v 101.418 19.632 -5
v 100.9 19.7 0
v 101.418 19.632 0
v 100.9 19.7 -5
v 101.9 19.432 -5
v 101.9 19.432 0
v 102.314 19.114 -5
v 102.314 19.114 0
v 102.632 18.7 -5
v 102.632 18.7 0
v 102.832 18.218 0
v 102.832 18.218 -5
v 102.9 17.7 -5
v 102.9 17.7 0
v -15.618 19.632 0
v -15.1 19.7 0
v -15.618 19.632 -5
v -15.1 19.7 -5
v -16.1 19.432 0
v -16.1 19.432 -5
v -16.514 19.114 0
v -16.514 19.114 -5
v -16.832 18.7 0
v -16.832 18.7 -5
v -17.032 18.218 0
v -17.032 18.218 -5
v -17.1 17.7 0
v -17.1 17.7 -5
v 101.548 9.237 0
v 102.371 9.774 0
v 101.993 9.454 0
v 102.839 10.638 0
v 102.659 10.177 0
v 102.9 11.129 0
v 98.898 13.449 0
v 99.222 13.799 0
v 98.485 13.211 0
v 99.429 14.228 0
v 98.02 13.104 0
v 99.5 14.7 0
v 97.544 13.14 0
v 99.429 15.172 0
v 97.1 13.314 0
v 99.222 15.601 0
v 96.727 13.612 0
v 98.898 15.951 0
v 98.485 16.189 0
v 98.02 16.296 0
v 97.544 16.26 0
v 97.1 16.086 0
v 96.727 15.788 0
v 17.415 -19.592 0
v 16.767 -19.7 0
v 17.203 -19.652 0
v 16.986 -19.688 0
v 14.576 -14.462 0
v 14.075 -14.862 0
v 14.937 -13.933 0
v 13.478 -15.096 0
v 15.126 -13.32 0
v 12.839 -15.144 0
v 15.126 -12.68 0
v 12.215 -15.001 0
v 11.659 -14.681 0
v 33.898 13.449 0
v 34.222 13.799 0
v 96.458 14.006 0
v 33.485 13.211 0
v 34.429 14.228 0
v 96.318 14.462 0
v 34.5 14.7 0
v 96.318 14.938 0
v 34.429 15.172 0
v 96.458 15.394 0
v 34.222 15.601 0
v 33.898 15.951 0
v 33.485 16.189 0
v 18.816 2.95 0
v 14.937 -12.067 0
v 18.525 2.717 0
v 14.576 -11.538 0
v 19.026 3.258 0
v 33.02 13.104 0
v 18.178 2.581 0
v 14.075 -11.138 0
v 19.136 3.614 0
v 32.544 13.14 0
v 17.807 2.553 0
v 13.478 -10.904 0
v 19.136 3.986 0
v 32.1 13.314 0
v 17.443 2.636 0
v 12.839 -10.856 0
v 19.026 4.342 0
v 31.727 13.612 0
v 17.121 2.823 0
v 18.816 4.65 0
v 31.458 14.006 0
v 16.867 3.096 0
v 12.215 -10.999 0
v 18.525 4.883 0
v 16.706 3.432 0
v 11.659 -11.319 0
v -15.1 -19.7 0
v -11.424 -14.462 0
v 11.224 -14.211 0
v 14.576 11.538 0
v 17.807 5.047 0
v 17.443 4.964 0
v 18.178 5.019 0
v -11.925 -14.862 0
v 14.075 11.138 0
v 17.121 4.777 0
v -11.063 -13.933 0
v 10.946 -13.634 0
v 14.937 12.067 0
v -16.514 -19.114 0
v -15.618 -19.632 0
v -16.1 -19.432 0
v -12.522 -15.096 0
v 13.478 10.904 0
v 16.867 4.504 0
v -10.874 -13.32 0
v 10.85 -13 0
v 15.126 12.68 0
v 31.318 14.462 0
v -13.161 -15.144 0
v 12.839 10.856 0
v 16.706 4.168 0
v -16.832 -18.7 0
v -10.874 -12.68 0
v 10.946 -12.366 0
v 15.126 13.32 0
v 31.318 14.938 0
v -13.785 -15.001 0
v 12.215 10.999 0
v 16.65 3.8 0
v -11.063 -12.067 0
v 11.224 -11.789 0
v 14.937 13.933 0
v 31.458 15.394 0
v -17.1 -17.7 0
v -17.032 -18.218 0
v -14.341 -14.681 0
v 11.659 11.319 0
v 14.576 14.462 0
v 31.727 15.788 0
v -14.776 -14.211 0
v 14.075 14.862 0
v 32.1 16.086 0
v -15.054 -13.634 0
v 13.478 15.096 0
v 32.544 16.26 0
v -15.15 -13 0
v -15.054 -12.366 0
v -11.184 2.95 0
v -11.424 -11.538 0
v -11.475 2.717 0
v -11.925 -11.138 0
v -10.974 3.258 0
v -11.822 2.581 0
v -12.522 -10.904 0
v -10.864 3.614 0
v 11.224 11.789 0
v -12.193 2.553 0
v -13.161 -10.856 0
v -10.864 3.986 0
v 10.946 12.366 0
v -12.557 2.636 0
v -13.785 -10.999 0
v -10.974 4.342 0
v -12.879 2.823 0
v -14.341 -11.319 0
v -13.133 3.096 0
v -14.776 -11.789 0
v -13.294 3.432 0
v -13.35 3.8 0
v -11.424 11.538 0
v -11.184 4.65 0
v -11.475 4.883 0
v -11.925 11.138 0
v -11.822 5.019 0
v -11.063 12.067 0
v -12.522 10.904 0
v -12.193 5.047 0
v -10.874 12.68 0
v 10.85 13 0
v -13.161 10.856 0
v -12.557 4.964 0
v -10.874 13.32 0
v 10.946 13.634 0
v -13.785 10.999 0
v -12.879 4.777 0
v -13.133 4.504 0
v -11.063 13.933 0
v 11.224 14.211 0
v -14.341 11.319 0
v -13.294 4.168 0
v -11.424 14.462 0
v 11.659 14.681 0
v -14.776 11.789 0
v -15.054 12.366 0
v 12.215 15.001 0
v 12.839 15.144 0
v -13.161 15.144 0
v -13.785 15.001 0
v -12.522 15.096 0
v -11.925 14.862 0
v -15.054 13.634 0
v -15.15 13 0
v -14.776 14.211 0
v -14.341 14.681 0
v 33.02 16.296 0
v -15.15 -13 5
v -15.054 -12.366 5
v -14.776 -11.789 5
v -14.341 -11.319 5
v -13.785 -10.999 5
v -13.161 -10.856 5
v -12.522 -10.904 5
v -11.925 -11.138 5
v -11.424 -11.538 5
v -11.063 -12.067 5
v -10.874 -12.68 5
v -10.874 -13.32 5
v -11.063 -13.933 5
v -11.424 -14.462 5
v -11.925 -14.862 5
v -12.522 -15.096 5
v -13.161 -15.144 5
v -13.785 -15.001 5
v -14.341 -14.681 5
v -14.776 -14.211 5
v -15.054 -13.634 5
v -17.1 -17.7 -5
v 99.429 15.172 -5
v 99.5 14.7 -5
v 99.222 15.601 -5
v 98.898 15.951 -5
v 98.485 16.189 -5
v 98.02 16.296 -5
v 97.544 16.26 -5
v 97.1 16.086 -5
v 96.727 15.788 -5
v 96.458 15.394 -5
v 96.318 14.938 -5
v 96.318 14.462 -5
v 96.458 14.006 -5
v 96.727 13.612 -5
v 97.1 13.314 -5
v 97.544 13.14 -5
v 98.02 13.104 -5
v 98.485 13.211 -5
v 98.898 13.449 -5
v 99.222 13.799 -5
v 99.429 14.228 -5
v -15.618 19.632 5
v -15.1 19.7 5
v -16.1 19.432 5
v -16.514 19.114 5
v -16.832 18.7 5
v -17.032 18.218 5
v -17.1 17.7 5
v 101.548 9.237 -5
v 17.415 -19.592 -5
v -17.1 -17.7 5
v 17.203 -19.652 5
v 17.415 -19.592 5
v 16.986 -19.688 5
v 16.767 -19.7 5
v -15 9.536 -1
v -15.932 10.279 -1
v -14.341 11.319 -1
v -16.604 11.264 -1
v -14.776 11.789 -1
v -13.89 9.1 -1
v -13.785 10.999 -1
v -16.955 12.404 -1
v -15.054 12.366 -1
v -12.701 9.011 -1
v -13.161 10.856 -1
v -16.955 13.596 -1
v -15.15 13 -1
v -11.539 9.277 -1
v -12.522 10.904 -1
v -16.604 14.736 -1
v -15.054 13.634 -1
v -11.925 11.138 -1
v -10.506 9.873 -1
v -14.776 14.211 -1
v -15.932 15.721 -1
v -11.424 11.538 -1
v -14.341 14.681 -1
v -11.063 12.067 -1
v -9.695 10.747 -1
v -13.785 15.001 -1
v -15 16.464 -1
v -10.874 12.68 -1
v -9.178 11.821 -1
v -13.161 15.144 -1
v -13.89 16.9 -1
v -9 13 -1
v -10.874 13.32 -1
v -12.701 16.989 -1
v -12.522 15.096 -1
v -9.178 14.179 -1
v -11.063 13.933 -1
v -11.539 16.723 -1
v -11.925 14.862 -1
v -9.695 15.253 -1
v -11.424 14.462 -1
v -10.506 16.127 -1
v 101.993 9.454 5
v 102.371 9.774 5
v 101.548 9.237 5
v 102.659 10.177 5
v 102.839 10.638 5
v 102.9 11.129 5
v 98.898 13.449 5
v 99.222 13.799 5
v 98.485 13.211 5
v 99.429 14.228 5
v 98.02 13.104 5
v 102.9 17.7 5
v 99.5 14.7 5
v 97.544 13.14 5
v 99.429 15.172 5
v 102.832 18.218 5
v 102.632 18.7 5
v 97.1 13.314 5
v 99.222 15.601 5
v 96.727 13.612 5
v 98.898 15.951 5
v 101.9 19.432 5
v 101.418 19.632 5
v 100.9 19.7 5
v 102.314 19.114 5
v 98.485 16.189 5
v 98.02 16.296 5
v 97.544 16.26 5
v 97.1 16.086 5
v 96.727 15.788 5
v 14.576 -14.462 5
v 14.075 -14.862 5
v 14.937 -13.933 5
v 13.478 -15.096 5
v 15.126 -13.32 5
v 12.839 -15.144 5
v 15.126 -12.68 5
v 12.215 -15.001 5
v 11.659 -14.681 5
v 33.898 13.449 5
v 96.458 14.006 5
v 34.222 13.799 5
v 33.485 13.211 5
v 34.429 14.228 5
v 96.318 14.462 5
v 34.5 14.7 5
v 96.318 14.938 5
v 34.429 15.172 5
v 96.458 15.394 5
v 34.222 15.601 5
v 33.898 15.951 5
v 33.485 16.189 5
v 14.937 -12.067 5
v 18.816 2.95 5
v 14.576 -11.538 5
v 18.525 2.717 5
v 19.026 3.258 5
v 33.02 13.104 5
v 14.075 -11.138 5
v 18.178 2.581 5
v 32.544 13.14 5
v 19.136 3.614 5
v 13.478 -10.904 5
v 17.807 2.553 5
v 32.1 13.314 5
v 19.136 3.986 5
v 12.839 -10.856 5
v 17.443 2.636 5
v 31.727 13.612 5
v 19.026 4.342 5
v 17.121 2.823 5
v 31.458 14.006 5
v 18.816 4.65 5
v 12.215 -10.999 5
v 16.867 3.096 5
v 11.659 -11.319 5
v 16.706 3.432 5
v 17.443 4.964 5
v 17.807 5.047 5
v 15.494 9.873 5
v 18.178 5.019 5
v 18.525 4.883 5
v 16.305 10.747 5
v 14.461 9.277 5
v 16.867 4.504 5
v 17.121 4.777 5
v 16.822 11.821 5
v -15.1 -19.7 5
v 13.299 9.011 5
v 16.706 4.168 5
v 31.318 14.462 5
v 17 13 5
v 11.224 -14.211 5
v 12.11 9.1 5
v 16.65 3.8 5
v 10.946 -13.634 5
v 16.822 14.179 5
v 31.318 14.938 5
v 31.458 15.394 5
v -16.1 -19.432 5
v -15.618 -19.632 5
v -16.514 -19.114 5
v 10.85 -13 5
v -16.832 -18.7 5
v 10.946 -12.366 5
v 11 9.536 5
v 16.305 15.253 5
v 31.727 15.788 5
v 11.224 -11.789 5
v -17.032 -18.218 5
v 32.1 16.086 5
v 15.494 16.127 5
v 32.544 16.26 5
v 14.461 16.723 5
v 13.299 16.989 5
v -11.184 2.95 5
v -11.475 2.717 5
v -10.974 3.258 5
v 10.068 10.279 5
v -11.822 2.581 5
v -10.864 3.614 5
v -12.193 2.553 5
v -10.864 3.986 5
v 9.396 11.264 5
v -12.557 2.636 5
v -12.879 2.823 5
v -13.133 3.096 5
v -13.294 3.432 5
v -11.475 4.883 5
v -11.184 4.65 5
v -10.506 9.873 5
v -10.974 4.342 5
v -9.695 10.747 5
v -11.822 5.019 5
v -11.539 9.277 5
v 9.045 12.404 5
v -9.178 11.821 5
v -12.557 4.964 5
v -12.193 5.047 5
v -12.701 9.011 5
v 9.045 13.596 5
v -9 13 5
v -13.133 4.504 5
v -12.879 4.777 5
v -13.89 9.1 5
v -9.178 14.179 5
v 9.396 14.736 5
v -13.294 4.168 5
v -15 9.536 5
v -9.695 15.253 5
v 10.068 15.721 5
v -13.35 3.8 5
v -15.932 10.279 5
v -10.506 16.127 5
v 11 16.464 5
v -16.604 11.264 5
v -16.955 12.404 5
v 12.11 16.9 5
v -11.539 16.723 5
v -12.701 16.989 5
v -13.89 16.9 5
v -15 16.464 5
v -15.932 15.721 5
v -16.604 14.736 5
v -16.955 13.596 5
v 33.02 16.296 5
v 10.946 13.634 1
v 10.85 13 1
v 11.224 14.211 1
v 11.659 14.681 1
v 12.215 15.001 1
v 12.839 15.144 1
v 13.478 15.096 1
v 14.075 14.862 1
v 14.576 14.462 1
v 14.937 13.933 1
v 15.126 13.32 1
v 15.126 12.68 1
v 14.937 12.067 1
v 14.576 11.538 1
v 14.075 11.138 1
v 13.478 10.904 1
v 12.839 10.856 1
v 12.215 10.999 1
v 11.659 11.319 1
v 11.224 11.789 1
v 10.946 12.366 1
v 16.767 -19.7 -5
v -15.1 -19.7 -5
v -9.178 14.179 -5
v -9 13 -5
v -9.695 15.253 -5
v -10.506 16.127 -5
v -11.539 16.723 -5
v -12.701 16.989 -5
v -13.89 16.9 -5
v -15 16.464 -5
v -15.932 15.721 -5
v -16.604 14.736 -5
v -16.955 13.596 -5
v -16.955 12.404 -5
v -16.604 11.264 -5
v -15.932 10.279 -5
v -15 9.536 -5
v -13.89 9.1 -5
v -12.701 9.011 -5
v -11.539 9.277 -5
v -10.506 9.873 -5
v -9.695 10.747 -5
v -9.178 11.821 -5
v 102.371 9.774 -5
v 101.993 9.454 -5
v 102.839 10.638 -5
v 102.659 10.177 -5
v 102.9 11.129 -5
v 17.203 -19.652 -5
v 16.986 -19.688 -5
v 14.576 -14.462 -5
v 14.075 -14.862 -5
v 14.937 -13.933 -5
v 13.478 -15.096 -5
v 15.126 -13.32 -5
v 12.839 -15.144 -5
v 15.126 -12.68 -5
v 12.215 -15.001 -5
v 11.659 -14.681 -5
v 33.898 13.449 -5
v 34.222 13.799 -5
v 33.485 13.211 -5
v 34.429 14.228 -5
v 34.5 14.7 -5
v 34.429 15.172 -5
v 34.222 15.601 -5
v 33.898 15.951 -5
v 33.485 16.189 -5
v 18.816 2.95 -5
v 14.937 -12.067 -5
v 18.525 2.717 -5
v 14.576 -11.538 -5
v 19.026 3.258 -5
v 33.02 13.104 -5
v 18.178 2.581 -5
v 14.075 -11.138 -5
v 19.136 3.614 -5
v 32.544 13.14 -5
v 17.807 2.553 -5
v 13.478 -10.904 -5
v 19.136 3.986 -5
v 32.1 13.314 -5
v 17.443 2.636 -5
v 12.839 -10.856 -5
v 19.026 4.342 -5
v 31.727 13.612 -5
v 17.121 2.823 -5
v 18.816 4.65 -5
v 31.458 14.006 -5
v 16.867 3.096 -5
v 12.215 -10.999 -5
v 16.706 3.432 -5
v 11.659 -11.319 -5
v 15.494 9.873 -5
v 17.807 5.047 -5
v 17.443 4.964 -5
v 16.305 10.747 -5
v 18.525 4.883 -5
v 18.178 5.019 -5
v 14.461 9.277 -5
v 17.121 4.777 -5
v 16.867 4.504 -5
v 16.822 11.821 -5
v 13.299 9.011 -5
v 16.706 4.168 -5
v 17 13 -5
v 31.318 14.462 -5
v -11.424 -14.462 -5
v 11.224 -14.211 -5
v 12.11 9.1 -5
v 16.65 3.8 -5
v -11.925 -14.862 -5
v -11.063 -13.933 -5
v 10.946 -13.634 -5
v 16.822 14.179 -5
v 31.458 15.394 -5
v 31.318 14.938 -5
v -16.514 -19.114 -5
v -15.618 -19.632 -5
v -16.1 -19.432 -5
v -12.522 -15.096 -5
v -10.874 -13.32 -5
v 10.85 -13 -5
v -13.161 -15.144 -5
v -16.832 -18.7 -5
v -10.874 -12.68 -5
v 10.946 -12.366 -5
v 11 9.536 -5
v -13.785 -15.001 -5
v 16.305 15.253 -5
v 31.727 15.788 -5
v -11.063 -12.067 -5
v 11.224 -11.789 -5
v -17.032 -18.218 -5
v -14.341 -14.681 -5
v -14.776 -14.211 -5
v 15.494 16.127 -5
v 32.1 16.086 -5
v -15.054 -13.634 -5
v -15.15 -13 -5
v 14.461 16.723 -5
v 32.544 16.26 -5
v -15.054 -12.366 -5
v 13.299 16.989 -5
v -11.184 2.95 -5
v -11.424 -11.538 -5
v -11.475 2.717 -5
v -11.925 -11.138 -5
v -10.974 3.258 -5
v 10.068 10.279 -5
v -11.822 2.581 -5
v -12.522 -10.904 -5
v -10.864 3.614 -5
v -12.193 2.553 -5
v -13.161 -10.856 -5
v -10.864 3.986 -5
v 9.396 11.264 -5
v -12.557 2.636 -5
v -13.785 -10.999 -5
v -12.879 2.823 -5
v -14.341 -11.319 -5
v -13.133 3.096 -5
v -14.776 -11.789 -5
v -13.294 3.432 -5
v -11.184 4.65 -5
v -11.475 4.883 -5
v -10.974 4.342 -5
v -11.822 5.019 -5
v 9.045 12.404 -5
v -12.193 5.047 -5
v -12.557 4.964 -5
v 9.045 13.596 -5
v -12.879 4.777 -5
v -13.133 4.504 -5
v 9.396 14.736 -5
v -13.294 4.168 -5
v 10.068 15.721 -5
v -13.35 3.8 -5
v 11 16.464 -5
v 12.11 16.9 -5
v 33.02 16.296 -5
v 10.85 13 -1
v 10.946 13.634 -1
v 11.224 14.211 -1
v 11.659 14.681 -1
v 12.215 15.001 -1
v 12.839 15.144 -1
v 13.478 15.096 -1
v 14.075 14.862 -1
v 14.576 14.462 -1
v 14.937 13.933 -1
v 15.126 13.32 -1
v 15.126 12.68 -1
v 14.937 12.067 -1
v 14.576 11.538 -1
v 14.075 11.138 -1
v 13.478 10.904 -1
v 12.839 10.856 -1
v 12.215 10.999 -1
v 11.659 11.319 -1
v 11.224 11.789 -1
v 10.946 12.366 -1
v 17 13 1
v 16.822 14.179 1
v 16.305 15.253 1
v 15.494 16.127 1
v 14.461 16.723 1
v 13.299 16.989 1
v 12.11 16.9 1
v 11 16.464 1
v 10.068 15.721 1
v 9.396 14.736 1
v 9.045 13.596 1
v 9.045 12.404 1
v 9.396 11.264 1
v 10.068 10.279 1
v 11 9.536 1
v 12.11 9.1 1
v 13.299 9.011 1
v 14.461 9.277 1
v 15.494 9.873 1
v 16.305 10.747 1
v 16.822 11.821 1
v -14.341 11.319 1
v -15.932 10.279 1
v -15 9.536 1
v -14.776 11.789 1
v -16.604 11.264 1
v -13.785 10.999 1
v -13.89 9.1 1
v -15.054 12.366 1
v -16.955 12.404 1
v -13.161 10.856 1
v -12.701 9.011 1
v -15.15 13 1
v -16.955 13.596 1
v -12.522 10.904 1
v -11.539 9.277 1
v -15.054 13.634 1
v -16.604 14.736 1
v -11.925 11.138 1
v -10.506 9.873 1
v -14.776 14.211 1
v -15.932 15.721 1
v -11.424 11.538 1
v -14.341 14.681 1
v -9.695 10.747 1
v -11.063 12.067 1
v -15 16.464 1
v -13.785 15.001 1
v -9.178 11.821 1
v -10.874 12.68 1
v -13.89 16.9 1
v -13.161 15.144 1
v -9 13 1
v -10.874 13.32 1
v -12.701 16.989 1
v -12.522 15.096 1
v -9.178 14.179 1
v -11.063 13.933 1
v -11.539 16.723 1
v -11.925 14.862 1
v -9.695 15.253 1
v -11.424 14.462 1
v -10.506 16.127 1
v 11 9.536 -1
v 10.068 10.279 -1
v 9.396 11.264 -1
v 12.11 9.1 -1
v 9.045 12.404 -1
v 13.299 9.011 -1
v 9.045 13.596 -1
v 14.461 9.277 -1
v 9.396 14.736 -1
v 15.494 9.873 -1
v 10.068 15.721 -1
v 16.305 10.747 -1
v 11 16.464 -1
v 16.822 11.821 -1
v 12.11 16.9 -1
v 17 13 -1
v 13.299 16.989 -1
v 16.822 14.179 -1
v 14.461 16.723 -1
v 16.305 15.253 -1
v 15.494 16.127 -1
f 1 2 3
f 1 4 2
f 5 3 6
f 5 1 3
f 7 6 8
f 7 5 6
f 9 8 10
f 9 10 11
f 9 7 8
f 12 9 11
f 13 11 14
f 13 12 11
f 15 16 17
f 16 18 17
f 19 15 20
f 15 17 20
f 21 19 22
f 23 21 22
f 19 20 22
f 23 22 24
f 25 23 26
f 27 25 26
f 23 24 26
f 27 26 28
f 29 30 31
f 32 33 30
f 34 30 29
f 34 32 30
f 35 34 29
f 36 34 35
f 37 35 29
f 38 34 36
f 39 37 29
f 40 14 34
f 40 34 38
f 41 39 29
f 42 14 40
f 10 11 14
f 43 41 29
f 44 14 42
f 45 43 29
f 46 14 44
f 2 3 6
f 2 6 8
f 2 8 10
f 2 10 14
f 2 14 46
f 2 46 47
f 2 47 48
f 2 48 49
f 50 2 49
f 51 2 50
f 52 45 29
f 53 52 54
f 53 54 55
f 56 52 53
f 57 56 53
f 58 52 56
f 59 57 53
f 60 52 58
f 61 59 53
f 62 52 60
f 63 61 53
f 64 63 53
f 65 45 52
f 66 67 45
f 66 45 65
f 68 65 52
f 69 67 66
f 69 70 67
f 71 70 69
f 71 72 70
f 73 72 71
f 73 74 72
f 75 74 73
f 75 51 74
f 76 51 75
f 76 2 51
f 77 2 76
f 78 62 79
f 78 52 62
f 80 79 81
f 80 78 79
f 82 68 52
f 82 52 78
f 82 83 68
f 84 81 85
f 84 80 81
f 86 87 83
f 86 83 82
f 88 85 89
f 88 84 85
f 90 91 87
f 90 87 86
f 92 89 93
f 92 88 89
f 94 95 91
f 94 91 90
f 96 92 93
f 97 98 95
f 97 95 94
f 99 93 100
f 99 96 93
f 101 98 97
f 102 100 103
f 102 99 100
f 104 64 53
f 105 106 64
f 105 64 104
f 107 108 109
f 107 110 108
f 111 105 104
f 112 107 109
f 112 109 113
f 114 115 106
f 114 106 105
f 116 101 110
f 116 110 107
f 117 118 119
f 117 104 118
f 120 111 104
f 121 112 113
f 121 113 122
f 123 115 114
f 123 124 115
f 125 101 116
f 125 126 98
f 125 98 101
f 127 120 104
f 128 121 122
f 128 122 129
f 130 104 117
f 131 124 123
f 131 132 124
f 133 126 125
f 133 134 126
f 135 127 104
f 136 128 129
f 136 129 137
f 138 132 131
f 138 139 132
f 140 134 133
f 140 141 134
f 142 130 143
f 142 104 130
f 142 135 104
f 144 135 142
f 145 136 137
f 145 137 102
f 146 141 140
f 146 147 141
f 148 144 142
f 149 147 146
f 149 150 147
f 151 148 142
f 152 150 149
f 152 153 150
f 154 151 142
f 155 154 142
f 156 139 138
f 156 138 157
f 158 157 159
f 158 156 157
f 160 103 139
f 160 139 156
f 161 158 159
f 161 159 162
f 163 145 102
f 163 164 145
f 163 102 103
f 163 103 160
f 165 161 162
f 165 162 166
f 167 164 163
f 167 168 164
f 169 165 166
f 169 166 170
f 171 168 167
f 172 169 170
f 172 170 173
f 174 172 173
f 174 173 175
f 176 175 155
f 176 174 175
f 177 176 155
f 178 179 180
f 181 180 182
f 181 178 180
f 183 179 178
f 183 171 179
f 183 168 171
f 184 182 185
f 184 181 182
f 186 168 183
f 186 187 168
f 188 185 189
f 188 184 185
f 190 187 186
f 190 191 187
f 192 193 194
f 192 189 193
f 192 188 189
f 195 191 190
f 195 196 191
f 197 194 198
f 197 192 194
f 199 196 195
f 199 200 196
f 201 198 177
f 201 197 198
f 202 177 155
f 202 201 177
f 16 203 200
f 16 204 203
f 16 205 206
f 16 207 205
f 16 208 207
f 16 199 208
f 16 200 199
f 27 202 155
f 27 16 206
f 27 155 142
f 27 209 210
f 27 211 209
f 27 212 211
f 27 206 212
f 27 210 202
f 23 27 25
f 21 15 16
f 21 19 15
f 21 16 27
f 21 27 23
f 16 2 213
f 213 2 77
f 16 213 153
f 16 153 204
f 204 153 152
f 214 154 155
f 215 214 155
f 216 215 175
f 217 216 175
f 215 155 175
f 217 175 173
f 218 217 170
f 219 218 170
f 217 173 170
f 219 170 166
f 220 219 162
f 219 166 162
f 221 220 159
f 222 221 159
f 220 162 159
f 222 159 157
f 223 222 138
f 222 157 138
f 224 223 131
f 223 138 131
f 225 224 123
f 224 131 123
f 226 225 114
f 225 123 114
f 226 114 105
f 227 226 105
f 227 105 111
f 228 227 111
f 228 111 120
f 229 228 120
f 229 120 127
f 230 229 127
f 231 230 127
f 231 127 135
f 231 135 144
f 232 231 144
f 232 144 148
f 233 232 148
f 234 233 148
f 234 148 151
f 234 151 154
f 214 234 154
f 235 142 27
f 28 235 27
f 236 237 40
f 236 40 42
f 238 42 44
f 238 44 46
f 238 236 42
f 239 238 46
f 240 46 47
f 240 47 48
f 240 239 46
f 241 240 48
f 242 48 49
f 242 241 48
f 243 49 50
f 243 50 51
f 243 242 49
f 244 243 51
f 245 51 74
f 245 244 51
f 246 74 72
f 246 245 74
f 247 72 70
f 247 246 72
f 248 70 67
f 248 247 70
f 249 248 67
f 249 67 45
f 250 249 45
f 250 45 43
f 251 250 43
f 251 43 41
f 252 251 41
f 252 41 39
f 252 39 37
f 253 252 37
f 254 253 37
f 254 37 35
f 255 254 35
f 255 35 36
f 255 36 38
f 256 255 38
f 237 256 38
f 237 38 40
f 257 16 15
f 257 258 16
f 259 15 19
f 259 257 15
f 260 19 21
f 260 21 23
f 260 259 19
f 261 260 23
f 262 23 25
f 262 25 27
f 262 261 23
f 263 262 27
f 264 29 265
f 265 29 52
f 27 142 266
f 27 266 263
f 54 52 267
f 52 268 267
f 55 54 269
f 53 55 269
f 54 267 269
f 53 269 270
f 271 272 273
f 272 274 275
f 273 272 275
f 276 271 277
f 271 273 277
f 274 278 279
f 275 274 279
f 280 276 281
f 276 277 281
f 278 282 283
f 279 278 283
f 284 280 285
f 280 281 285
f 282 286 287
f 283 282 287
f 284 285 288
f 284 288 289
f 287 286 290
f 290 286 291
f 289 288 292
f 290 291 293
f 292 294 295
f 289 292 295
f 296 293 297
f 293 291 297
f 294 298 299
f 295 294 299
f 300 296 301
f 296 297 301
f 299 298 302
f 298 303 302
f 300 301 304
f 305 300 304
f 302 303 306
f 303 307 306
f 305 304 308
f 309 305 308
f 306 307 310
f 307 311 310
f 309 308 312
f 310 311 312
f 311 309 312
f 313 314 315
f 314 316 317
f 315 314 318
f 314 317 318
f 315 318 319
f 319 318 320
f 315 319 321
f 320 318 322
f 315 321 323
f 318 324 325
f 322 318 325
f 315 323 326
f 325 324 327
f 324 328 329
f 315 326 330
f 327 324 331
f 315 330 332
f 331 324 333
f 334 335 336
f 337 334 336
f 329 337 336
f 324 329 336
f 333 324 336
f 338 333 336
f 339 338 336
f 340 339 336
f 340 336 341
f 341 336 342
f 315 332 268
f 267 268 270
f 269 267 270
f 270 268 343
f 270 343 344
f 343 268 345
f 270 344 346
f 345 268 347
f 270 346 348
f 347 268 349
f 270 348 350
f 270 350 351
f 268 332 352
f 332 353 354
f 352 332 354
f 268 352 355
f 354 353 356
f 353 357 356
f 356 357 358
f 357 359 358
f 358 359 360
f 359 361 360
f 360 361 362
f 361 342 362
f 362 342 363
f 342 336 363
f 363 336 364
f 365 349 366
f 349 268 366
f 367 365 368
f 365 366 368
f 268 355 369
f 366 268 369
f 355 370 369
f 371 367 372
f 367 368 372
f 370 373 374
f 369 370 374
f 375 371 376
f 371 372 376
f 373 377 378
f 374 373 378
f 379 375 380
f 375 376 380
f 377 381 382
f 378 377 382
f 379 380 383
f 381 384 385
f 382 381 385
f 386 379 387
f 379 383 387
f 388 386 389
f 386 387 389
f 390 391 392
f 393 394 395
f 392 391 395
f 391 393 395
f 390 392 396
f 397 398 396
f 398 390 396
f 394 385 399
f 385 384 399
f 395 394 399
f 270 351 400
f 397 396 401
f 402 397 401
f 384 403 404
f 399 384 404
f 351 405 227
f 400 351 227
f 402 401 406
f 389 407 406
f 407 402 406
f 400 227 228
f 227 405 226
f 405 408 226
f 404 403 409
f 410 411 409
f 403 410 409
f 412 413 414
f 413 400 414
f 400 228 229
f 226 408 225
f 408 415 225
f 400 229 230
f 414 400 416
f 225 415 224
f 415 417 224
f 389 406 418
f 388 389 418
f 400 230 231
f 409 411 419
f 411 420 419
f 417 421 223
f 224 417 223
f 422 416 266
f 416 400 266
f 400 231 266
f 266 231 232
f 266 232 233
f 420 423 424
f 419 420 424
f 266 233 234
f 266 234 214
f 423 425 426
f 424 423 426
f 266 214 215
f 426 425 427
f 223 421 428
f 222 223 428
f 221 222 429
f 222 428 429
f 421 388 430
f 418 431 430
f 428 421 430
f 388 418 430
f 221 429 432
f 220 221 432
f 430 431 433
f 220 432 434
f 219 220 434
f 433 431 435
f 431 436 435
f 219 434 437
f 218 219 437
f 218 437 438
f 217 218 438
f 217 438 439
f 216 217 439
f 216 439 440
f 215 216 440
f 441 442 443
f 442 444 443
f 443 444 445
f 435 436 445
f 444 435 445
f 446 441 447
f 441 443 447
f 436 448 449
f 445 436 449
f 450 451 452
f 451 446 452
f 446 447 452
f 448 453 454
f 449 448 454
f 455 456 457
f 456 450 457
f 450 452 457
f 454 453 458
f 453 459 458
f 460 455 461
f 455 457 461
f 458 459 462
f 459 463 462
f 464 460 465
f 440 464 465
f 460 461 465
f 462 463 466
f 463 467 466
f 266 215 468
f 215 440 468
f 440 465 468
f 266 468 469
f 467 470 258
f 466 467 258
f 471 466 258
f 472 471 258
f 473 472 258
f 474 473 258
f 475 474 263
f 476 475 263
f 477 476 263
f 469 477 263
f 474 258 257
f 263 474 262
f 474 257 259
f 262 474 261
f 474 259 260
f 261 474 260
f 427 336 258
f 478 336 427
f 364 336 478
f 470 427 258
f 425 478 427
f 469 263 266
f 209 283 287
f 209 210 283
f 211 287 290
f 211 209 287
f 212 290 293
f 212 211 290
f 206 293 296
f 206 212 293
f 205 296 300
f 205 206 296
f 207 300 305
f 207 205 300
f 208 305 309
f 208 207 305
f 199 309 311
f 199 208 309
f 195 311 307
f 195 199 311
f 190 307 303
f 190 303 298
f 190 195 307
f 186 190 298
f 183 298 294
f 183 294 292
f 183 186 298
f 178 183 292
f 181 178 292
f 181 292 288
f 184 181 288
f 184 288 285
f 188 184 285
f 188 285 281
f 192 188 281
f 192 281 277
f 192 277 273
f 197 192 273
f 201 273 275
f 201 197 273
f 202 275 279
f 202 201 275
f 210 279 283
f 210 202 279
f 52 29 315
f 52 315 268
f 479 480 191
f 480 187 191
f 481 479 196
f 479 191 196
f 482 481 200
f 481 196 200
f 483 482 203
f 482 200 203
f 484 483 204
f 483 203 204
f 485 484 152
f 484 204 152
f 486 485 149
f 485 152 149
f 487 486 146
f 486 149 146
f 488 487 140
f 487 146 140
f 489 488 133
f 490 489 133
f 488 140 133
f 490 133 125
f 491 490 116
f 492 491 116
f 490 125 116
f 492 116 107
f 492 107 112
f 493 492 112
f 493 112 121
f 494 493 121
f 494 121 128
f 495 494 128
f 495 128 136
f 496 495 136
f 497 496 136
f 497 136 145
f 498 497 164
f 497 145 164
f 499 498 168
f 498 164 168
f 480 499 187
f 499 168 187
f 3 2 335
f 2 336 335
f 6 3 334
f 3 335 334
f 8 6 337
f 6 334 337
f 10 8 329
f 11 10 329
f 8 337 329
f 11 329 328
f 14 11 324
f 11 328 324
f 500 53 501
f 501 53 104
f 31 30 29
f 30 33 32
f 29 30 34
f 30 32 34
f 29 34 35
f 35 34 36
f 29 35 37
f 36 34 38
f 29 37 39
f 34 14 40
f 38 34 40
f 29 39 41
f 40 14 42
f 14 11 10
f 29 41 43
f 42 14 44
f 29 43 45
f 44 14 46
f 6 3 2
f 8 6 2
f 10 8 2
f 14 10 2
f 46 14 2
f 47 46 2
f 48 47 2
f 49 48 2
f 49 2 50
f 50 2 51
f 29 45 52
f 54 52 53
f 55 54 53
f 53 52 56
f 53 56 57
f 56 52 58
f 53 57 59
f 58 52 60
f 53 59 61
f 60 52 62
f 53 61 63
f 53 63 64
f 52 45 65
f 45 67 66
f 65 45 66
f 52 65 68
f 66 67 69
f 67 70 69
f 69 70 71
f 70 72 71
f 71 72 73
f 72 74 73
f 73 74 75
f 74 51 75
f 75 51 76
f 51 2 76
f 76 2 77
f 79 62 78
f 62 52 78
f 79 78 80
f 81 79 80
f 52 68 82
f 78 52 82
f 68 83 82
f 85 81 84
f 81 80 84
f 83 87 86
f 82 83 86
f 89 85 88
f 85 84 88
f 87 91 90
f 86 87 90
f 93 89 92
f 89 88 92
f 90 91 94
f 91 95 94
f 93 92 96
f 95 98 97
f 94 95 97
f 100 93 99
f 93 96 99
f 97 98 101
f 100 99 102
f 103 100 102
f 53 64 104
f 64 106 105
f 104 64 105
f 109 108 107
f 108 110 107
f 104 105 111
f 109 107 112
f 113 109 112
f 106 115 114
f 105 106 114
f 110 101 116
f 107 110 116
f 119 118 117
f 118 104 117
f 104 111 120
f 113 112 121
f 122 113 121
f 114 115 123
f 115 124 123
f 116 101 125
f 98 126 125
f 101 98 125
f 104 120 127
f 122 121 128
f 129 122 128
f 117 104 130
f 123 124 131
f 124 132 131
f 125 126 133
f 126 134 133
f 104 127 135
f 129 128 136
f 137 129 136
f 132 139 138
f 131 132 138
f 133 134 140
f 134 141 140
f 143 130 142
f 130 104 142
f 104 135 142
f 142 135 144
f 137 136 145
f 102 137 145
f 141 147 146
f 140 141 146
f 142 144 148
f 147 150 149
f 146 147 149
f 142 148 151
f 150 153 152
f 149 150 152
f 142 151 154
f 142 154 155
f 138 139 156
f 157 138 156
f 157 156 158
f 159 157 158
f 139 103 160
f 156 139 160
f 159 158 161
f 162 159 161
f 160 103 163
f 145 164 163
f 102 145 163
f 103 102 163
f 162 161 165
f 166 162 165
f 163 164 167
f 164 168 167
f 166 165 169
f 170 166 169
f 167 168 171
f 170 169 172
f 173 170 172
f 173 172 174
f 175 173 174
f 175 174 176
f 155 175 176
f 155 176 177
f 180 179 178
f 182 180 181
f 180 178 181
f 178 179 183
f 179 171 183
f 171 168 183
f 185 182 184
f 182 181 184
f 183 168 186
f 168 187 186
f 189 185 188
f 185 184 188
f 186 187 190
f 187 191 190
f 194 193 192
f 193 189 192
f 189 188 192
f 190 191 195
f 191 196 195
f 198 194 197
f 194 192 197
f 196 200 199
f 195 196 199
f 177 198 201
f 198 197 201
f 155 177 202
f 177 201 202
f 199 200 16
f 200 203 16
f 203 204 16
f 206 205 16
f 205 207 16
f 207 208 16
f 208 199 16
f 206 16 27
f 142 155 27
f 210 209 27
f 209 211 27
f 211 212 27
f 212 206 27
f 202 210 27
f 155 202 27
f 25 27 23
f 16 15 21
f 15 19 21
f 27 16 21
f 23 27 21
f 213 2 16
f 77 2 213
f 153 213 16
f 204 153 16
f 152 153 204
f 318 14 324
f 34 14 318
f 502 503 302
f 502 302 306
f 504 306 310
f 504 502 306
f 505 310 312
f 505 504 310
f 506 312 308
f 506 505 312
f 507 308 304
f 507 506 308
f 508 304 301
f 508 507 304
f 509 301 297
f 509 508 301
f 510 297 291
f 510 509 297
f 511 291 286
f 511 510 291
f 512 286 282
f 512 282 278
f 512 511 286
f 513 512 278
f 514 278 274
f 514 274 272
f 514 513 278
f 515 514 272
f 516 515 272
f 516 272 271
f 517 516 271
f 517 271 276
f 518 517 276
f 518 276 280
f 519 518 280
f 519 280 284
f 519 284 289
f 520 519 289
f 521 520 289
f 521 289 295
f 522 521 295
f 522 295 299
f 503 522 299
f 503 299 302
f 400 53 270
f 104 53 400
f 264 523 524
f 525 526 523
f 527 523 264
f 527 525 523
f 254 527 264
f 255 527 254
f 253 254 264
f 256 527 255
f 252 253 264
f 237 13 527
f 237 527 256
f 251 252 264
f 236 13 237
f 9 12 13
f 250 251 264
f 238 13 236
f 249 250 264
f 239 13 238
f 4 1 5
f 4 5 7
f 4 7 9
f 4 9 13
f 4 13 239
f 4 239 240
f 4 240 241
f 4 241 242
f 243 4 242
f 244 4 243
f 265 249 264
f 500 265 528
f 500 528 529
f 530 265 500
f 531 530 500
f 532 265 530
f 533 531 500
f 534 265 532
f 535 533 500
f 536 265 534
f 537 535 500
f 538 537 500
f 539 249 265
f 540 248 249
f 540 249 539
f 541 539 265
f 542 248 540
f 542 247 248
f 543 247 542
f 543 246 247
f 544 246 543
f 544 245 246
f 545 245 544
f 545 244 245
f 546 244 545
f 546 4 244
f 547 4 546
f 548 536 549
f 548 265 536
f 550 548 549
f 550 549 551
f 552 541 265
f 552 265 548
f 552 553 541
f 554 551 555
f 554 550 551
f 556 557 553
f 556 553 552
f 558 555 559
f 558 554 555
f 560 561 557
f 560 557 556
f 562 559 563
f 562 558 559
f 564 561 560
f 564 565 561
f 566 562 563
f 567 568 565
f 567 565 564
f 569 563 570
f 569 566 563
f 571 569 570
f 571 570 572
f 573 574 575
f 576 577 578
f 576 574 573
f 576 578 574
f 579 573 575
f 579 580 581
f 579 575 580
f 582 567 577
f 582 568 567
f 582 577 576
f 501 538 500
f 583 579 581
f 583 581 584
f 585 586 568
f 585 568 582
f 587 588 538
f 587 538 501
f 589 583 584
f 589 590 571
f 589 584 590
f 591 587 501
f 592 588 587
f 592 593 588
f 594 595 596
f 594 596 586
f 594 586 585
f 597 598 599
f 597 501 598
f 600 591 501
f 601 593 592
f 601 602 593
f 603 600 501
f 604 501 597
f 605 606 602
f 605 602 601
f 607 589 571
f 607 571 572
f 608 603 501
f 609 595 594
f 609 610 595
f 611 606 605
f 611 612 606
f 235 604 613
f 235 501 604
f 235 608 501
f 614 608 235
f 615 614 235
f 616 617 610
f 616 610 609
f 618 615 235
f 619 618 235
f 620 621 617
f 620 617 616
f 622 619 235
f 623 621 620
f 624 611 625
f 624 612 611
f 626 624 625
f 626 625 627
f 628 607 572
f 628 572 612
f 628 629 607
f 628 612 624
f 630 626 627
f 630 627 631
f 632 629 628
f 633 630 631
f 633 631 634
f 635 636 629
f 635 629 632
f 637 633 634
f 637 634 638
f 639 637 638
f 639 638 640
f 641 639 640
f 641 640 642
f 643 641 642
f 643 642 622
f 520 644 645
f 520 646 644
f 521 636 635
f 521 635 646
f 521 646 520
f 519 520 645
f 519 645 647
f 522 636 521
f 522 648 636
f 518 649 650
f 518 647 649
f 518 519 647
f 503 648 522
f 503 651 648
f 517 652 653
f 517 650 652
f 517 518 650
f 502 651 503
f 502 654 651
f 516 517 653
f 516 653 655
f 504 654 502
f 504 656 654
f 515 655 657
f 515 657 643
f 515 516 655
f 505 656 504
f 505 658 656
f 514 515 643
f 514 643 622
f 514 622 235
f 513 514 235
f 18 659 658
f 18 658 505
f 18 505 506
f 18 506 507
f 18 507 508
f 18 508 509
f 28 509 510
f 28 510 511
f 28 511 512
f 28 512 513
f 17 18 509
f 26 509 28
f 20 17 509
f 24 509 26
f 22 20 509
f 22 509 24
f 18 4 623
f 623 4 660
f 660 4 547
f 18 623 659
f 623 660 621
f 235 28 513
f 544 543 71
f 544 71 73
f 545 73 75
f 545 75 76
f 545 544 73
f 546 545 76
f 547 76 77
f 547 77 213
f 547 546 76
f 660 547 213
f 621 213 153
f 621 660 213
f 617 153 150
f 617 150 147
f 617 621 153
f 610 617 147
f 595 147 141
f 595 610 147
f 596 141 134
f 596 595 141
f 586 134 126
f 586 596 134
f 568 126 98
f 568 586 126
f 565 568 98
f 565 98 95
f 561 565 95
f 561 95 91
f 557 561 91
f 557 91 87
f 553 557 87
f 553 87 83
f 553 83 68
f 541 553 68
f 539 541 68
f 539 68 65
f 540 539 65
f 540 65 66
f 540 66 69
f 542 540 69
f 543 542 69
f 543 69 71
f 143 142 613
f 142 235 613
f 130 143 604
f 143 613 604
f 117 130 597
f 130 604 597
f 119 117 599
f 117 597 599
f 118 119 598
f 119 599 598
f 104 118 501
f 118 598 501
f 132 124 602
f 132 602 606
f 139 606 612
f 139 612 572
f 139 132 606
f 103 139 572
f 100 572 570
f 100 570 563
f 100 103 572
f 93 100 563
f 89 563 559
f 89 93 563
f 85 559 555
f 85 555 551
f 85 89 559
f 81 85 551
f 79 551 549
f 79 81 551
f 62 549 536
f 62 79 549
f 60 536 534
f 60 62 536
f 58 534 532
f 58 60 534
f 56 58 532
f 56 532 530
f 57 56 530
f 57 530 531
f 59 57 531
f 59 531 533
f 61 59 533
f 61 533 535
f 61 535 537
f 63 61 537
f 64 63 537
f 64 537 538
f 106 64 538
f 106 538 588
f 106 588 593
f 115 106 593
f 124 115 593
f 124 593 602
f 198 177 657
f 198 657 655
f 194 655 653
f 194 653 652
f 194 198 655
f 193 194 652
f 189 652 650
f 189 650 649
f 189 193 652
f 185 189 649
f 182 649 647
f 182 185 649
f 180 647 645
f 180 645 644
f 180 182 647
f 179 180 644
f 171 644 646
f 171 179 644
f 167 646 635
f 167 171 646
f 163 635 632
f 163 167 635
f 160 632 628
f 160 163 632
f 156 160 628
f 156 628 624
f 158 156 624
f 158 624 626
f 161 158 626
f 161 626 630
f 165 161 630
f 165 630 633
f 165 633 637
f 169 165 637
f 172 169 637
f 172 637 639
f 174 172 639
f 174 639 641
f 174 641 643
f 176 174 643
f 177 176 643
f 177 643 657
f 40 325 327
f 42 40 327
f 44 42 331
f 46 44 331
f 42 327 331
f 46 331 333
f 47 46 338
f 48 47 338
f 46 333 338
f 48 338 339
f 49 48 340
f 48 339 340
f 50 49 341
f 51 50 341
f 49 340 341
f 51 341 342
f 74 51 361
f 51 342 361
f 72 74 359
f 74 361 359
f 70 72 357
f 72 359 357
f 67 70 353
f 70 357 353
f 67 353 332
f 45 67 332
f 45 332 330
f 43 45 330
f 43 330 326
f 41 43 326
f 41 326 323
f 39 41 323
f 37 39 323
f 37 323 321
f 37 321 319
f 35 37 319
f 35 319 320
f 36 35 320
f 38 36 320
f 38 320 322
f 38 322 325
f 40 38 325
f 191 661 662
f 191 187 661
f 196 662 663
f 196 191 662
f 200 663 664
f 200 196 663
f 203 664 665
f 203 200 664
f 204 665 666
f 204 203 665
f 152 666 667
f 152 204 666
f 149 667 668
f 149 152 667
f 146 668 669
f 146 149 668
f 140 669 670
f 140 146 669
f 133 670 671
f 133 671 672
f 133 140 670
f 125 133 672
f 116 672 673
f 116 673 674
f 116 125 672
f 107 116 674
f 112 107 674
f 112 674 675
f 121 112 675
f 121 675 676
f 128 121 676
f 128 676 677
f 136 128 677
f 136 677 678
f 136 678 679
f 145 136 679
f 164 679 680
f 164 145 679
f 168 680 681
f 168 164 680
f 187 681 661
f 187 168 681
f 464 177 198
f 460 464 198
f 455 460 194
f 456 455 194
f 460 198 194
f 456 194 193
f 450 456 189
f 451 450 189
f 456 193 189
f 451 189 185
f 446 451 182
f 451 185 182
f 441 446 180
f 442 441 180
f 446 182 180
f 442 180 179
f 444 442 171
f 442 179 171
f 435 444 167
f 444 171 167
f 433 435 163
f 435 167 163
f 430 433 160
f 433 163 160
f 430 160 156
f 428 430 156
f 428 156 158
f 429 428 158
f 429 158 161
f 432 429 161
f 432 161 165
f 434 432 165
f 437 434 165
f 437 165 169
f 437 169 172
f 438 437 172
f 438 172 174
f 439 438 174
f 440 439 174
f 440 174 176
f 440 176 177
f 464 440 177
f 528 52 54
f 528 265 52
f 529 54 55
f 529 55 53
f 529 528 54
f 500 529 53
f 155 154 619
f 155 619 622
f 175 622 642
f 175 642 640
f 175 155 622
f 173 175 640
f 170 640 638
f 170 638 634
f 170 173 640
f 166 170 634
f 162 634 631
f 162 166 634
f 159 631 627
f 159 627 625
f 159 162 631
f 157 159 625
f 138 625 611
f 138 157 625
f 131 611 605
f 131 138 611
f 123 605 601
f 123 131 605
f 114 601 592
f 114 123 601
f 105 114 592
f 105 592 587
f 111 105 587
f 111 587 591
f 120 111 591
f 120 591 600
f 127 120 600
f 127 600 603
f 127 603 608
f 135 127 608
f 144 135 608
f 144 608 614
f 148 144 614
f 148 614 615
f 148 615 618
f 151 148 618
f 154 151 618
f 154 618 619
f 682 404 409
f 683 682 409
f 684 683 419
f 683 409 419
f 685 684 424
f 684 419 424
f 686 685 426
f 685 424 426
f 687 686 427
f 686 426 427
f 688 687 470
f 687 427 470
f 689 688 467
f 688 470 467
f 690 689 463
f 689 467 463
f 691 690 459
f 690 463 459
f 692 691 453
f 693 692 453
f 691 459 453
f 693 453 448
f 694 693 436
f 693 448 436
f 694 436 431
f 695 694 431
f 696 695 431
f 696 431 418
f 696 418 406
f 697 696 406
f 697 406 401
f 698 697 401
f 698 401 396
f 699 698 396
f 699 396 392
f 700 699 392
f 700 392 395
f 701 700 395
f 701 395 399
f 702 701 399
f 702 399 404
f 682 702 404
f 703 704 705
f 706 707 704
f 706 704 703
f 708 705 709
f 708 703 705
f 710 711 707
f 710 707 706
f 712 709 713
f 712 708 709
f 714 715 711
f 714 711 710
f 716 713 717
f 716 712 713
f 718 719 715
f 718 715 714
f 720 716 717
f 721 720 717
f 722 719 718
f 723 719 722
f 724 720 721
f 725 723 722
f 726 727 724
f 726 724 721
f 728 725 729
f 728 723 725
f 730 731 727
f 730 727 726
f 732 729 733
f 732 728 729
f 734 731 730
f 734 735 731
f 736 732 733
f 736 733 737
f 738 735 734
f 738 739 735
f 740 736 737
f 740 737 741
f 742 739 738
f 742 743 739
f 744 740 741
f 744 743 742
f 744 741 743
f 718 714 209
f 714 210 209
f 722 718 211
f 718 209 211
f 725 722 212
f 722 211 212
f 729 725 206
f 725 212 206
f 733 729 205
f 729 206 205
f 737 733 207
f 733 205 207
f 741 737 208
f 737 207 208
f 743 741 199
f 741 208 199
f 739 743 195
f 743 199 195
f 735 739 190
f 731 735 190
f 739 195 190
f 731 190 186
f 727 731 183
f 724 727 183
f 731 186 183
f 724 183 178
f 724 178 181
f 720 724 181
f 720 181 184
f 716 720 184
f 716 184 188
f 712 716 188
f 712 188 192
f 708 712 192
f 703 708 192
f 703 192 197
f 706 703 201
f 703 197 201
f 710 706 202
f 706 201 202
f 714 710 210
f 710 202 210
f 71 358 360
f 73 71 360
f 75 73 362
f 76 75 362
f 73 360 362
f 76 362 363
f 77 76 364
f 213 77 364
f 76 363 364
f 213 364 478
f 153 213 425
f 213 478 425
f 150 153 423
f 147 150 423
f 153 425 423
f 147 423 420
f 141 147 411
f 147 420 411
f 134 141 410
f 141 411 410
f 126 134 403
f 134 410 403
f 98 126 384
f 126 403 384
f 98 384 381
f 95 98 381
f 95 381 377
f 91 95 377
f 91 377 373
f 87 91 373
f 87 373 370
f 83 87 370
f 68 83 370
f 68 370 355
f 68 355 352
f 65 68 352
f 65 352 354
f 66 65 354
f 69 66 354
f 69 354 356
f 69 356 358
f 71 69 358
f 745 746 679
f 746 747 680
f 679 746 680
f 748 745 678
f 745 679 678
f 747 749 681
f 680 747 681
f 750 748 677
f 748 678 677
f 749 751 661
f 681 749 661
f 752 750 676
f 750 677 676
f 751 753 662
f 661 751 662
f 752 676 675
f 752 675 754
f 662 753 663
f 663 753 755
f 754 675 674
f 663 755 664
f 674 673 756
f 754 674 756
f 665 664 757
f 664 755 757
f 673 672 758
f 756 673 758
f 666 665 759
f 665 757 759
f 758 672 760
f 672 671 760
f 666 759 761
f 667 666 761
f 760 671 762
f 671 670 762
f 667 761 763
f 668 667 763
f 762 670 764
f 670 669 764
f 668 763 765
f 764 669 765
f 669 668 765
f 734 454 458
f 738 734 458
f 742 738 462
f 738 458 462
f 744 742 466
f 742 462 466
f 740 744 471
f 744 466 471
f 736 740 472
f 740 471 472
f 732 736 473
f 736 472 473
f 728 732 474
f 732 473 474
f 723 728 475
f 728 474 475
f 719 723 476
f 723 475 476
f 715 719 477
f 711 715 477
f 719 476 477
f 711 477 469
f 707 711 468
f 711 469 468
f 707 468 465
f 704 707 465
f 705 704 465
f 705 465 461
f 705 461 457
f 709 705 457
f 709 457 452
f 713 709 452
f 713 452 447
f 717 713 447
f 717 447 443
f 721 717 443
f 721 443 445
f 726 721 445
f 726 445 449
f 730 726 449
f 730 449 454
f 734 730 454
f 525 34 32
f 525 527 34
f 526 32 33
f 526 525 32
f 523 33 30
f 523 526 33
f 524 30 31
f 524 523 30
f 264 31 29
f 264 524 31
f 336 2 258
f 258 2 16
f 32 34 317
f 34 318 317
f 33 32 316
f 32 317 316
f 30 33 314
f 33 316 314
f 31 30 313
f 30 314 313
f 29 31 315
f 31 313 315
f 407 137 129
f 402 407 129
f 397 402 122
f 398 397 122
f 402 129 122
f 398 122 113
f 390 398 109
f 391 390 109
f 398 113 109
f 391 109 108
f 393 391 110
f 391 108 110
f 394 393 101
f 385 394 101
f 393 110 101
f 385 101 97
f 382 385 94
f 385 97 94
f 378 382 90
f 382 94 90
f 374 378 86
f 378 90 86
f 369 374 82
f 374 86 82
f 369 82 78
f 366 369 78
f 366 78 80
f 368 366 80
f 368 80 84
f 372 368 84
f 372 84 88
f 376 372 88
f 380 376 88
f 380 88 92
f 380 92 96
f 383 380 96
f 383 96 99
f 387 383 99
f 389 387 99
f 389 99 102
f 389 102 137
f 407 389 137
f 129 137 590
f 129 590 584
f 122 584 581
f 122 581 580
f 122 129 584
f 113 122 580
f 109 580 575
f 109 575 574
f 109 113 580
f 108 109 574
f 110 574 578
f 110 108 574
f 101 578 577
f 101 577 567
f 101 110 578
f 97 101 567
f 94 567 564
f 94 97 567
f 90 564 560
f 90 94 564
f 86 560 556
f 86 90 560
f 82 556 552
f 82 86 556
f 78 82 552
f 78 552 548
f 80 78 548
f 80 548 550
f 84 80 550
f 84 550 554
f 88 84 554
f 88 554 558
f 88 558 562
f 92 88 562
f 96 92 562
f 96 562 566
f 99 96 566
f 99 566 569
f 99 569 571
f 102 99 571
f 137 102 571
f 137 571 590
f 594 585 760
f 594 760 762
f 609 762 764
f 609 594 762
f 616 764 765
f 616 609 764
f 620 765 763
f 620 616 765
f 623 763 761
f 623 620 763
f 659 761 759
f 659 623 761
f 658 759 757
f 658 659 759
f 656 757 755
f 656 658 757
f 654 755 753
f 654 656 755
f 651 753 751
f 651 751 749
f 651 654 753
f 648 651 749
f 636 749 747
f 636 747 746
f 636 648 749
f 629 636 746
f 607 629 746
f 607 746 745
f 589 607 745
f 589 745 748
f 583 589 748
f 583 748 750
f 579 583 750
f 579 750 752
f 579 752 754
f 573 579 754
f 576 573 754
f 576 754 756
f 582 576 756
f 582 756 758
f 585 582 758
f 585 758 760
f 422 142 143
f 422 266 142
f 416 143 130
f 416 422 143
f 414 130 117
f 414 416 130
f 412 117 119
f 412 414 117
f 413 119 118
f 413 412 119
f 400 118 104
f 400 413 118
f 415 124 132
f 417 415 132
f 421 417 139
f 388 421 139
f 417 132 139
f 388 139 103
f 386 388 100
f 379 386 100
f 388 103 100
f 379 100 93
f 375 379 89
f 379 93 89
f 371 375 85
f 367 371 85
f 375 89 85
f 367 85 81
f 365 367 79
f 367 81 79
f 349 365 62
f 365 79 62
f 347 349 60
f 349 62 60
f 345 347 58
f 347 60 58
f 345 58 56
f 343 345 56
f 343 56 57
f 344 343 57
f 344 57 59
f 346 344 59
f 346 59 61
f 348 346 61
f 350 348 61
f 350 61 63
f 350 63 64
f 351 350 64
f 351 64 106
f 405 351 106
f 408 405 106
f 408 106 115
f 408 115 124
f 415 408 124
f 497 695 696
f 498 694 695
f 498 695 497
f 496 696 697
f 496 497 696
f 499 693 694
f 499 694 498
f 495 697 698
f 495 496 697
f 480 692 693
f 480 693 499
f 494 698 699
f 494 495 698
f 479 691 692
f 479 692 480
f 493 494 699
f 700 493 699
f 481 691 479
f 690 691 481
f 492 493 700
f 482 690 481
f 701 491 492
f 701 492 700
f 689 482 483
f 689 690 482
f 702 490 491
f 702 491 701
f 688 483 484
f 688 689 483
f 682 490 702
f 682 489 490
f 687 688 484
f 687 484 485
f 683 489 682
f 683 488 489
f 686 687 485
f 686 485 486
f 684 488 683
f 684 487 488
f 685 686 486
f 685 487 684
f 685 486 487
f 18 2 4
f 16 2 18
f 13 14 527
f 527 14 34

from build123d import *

# Parameters (mm, degrees)
BOSS_EXTRUDE1_DEPTH            = 5
CBORE_FOR_M4_SHCS1_D           = 4.3
CBORE_FOR_M4_SHCS1_CBORE_D     = 8
CBORE_FOR_M4_SHCS1_CBORE_DEPTH = 4
M4_CLEARANCE_HOLE1_D           = 4.3
TAP_DRILL_FOR_M3X0_5_TAP1_D    = 2.5
M3_CLEARANCE_HOLE2_D           = 3.2
FILLET1_R                      = 2


with BuildPart() as part:
    # Sketch1 → Boss-Extrude1 (new body)
    with BuildSketch(Plane.XY):
        Polygon((17.1, 19.7), (102.9, 19.7), (102.9, 9.7), (17.1, -19.7), (-17.1, -19.7), (-17.1, 19.7), align=None)
    extrude(amount=BOSS_EXTRUDE1_DEPTH)

    # CBORE for M4 SHCS1 (through all)
    with Locations(Plane.XY.offset(5)):
        with Locations((13, 13), (-13, 13)):
            CounterBoreHole(CBORE_FOR_M4_SHCS1_D / 2, CBORE_FOR_M4_SHCS1_CBORE_D / 2, CBORE_FOR_M4_SHCS1_CBORE_DEPTH)

    # M4 Clearance Hole1 (through all)
    with Locations(Plane.XY.offset(5)):
        with Locations((-13, -13), (13, -13)):
            Hole(M4_CLEARANCE_HOLE1_D / 2)

    # Tap Drill for M3x0.5 Tap1 (through all)
    with Locations(Plane.XY.offset(5)):
        with Locations((-12.1, 3.8), (17.9, 3.8)):
            Hole(TAP_DRILL_FOR_M3X0_5_TAP1_D / 2)

    # M3 Clearance Hole2 (through all)
    with Locations(Plane(origin=(0, 0, 0), x_dir=(-1, 0, 0), z_dir=(0, 0, -1))):
        with Locations((-97.9, 14.7), (-32.9, 14.7)):
            Hole(M3_CLEARANCE_HOLE2_D / 2)

    # Fillet1
    fillet1_edges = [part.edges().sort_by_distance(p)[0] for p in [
        (-17.1, 19.7, 2.5),
        (102.9, 19.7, 2.5),
        (102.9, 9.7, 2.5),
        (17.1, -19.7, 2.5),
        (-17.1, -19.7, 2.5),
    ]]
    fillet(fillet1_edges, radius=FILLET1_R)


with BuildPart() as body_2:
    # Mirror1: mirrored copy
    add(part.part.mirror(Plane.XY))


solid = Compound([part.part, body_2.part])
